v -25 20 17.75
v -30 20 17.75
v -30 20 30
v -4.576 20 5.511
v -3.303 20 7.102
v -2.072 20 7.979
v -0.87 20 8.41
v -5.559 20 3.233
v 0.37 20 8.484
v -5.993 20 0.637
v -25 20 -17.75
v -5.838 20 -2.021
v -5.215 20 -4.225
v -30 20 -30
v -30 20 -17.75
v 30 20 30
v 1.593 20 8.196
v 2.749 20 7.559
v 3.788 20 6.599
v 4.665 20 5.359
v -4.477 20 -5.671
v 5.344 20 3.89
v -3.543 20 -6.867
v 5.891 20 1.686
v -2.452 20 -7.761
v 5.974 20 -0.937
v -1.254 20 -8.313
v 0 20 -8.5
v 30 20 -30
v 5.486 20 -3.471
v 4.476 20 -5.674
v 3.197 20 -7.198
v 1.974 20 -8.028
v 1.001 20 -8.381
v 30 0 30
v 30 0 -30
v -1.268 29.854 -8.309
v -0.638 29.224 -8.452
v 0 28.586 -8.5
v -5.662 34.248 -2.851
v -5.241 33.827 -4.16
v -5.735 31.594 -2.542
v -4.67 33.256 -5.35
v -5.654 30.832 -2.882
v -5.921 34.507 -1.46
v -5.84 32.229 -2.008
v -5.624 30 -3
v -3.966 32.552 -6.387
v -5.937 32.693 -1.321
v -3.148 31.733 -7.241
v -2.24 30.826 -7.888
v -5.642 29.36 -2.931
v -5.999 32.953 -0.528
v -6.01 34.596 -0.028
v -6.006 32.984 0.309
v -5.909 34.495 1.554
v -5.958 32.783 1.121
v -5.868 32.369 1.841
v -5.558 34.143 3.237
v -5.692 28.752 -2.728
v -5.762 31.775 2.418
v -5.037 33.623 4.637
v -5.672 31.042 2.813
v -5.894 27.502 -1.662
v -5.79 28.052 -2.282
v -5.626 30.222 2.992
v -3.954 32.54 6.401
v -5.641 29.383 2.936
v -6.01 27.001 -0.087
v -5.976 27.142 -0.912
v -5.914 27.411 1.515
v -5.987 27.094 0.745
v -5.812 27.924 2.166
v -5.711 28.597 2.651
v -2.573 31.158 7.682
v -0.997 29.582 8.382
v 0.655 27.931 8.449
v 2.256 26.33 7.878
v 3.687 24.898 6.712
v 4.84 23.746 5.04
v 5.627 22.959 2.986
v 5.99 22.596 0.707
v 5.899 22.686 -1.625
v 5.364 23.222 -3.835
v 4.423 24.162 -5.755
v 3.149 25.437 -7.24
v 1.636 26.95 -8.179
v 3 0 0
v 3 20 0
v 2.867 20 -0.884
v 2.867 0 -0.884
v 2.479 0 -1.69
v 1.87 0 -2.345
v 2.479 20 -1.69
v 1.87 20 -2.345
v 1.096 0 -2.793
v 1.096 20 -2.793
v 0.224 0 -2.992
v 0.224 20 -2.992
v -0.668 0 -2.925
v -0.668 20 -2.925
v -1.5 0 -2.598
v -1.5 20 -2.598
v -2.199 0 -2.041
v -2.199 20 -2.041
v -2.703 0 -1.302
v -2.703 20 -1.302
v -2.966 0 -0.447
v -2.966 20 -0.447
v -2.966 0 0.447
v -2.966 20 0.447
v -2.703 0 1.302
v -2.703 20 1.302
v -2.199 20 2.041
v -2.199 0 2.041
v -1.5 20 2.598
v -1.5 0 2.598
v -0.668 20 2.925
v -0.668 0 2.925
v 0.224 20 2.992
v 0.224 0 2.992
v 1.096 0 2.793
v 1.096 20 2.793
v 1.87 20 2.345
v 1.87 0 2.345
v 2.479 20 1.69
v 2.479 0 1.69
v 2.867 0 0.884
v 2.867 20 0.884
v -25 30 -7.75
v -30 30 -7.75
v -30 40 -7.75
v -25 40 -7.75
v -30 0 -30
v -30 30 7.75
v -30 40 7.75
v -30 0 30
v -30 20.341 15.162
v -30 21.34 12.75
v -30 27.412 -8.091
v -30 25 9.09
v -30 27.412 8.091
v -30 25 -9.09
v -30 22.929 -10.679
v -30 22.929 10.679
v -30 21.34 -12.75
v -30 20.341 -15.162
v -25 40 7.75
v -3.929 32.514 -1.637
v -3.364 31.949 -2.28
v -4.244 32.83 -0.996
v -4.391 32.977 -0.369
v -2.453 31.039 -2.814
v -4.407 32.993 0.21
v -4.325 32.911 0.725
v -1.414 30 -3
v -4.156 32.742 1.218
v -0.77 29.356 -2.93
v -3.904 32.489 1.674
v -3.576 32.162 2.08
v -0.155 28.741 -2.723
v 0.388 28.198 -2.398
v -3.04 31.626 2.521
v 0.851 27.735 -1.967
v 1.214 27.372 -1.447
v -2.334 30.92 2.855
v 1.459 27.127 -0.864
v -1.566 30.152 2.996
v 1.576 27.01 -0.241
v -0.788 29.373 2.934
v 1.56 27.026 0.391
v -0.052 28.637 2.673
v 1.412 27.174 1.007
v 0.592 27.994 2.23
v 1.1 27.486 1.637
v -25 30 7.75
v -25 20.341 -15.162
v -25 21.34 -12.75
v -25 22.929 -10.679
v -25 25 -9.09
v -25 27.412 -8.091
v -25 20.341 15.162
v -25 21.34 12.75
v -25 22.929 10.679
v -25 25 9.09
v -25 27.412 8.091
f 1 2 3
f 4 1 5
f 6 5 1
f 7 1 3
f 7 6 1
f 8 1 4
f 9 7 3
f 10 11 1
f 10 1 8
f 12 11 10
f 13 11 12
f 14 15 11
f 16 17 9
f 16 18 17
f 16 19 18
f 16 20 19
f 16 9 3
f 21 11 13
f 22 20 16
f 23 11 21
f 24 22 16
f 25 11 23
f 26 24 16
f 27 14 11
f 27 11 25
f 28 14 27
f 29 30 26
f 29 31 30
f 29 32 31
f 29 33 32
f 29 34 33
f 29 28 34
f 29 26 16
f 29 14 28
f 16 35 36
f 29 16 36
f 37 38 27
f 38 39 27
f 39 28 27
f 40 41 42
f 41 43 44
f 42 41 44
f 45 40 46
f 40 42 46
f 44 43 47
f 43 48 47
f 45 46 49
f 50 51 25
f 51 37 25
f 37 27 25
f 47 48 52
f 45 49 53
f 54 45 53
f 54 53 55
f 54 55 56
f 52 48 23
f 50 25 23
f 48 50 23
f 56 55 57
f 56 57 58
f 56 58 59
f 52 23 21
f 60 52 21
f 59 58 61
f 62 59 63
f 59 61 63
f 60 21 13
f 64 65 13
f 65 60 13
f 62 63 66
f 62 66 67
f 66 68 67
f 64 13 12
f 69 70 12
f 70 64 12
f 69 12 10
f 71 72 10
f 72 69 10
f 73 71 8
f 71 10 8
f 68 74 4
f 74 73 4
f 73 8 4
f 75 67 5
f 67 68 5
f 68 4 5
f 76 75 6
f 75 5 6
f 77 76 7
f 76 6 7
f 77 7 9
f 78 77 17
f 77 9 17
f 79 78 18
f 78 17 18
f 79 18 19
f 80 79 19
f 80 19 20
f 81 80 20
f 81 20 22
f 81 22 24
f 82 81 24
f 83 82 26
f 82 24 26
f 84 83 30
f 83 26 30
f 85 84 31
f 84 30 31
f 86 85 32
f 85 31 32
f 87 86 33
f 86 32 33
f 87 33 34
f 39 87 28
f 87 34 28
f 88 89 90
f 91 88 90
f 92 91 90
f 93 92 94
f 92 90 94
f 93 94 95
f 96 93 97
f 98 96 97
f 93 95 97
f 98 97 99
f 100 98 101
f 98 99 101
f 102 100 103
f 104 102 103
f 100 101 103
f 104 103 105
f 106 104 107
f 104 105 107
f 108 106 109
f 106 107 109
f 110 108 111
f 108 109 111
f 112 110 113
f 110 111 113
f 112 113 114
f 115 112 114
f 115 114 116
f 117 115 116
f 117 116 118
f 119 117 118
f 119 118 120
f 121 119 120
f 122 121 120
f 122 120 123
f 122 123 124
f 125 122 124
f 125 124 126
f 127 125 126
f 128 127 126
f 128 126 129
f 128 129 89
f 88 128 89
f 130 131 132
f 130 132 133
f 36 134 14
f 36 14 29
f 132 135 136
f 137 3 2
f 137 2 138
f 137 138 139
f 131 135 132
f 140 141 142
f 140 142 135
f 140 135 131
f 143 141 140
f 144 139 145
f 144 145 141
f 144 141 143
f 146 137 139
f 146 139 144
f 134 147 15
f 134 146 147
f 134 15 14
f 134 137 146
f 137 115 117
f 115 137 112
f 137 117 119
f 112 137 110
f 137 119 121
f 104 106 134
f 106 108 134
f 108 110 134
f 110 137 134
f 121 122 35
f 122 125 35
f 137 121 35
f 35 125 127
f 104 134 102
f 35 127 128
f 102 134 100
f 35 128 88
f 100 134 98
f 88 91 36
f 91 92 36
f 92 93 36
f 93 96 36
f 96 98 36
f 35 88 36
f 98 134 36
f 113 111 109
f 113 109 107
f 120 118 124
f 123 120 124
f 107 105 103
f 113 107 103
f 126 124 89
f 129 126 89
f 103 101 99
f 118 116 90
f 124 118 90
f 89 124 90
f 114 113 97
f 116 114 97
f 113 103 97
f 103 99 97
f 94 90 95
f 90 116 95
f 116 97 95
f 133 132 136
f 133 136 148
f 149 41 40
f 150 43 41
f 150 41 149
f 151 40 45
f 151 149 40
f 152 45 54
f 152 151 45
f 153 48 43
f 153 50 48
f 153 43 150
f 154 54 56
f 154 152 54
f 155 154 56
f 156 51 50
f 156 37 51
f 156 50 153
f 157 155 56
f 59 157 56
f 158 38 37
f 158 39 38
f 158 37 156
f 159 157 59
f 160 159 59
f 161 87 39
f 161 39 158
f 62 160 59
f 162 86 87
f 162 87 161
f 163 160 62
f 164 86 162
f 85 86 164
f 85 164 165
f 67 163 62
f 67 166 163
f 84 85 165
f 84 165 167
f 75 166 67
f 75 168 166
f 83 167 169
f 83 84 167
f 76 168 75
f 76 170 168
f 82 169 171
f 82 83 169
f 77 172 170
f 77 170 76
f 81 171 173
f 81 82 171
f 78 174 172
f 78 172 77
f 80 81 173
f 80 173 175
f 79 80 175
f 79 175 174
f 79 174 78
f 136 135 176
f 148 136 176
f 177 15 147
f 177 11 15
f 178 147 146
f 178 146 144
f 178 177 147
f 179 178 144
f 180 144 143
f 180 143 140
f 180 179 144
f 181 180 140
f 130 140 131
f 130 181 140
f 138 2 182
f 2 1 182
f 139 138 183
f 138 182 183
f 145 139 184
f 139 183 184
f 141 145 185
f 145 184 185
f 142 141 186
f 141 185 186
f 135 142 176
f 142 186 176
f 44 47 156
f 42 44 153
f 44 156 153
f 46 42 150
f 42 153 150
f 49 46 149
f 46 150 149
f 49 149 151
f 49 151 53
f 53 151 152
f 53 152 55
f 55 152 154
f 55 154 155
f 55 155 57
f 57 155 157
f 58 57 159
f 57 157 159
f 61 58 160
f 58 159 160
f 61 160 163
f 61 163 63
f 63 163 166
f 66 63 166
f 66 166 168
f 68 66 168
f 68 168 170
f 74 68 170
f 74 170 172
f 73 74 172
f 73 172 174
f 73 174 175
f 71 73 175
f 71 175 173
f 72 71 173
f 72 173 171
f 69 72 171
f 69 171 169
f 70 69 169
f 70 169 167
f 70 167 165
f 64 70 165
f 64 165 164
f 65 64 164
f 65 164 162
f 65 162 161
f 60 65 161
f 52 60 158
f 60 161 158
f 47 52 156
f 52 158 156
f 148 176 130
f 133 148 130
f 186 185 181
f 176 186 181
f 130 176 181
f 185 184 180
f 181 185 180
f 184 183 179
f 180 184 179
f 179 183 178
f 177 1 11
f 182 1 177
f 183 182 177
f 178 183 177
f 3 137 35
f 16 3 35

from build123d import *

# Parameters (mm, degrees)
SKETCH2_W               = 60
SKETCH2_H               = 60
BOSS_EXTRUDE1_DEPTH     = 20
SKETCH9_R               = 8.5
SKETCH10_RX             = 8.5
SKETCH10_RY             = 6.01040764
SKETCH12_R              = 3
CUT_EXTRUDE1_DEPTH      = 61
SKETCH13_R              = 3
CUT_EXTRUDE2_DEPTH      = 21
SKETCH15_W              = 5
SKETCH15_H              = 15.5
BOSS_EXTRUDE2_DEPTH     = 20
FILLET1_R               = 10
SKETCH17_W              = 28.111929505
SKETCH17_H              = 1
CUT_EXTRUDE3_DEPTH      = 23
CUT_EXTRUDE3_DEPTH_BACK = 3


with BuildPart() as part:
    # Sketch2 → Boss-Extrude1 (new body)
    with BuildSketch(Plane(origin=(0, 0, 0), x_dir=(1, 0, 0), z_dir=(0, 1, 0))):
        Rectangle(SKETCH2_W, SKETCH2_H)
    extrude(amount=BOSS_EXTRUDE1_DEPTH)

    # Sketch9 → Loft1 section 0
    with BuildSketch(Plane(origin=(15, 15, 0), x_dir=(0, 0, -1), z_dir=(0.707106781, 0.707106781, 0))):
        with Locations((0, 21.213203436)):
            Circle(SKETCH9_R)
    # Sketch10 → Loft1 section 1
    with BuildSketch(Plane(origin=(0, 20, 0), x_dir=(1, 0, 0), z_dir=(0, 1, 0))):
        with Locations(Location((0, 0), (0, 0, 90))):
            Ellipse(SKETCH10_RX, SKETCH10_RY)
    loft()

    # Sketch12 → Cut-Extrude1 (cut, through all)
    with BuildSketch(Plane(origin=(30, 0, 0), x_dir=(0, 0, -1), z_dir=(1, 0, 0))):
        with Locations((0, 30)):
            Circle(SKETCH12_R)
    extrude(amount=-CUT_EXTRUDE1_DEPTH, mode=Mode.SUBTRACT)

    # Sketch13 → Cut-Extrude2 (cut, through all)
    with BuildSketch(Plane(origin=(0, 20, 0), x_dir=(1, 0, 0), z_dir=(0, 1, 0))):
        Circle(SKETCH13_R)
    extrude(amount=-CUT_EXTRUDE2_DEPTH, mode=Mode.SUBTRACT)

    # Sketch15 → Boss-Extrude2 (add)
    with BuildSketch(Plane(origin=(0, 20, 0), x_dir=(1, 0, 0), z_dir=(0, 1, 0))):
        with Locations((-27.5, 0)):
            Rectangle(SKETCH15_W, SKETCH15_H)
    extrude(amount=BOSS_EXTRUDE2_DEPTH)

    # Fillet1
    fillet1_edges = [part.edges().sort_by_distance(p)[0] for p in [
        (-27.5, 20, 7.75),
        (-27.5, 20, -7.75),
    ]]
    fillet(fillet1_edges, radius=FILLET1_R)

    # Sketch17 → Cut-Extrude3 (cut, two sides)
    with BuildSketch(Plane(origin=(-8.98959236, 8.98959236, 0), x_dir=(0, 0, 1), z_dir=(-0.707106781, 0.707106781, 0))) as cut_extrude3_sk:
        with Locations((0.173110945, 20.713203436)):
            Rectangle(SKETCH17_W, SKETCH17_H)
    extrude(amount=CUT_EXTRUDE3_DEPTH, mode=Mode.SUBTRACT)
    extrude(cut_extrude3_sk.sketch, amount=-CUT_EXTRUDE3_DEPTH_BACK, mode=Mode.SUBTRACT)


solid = part.part
